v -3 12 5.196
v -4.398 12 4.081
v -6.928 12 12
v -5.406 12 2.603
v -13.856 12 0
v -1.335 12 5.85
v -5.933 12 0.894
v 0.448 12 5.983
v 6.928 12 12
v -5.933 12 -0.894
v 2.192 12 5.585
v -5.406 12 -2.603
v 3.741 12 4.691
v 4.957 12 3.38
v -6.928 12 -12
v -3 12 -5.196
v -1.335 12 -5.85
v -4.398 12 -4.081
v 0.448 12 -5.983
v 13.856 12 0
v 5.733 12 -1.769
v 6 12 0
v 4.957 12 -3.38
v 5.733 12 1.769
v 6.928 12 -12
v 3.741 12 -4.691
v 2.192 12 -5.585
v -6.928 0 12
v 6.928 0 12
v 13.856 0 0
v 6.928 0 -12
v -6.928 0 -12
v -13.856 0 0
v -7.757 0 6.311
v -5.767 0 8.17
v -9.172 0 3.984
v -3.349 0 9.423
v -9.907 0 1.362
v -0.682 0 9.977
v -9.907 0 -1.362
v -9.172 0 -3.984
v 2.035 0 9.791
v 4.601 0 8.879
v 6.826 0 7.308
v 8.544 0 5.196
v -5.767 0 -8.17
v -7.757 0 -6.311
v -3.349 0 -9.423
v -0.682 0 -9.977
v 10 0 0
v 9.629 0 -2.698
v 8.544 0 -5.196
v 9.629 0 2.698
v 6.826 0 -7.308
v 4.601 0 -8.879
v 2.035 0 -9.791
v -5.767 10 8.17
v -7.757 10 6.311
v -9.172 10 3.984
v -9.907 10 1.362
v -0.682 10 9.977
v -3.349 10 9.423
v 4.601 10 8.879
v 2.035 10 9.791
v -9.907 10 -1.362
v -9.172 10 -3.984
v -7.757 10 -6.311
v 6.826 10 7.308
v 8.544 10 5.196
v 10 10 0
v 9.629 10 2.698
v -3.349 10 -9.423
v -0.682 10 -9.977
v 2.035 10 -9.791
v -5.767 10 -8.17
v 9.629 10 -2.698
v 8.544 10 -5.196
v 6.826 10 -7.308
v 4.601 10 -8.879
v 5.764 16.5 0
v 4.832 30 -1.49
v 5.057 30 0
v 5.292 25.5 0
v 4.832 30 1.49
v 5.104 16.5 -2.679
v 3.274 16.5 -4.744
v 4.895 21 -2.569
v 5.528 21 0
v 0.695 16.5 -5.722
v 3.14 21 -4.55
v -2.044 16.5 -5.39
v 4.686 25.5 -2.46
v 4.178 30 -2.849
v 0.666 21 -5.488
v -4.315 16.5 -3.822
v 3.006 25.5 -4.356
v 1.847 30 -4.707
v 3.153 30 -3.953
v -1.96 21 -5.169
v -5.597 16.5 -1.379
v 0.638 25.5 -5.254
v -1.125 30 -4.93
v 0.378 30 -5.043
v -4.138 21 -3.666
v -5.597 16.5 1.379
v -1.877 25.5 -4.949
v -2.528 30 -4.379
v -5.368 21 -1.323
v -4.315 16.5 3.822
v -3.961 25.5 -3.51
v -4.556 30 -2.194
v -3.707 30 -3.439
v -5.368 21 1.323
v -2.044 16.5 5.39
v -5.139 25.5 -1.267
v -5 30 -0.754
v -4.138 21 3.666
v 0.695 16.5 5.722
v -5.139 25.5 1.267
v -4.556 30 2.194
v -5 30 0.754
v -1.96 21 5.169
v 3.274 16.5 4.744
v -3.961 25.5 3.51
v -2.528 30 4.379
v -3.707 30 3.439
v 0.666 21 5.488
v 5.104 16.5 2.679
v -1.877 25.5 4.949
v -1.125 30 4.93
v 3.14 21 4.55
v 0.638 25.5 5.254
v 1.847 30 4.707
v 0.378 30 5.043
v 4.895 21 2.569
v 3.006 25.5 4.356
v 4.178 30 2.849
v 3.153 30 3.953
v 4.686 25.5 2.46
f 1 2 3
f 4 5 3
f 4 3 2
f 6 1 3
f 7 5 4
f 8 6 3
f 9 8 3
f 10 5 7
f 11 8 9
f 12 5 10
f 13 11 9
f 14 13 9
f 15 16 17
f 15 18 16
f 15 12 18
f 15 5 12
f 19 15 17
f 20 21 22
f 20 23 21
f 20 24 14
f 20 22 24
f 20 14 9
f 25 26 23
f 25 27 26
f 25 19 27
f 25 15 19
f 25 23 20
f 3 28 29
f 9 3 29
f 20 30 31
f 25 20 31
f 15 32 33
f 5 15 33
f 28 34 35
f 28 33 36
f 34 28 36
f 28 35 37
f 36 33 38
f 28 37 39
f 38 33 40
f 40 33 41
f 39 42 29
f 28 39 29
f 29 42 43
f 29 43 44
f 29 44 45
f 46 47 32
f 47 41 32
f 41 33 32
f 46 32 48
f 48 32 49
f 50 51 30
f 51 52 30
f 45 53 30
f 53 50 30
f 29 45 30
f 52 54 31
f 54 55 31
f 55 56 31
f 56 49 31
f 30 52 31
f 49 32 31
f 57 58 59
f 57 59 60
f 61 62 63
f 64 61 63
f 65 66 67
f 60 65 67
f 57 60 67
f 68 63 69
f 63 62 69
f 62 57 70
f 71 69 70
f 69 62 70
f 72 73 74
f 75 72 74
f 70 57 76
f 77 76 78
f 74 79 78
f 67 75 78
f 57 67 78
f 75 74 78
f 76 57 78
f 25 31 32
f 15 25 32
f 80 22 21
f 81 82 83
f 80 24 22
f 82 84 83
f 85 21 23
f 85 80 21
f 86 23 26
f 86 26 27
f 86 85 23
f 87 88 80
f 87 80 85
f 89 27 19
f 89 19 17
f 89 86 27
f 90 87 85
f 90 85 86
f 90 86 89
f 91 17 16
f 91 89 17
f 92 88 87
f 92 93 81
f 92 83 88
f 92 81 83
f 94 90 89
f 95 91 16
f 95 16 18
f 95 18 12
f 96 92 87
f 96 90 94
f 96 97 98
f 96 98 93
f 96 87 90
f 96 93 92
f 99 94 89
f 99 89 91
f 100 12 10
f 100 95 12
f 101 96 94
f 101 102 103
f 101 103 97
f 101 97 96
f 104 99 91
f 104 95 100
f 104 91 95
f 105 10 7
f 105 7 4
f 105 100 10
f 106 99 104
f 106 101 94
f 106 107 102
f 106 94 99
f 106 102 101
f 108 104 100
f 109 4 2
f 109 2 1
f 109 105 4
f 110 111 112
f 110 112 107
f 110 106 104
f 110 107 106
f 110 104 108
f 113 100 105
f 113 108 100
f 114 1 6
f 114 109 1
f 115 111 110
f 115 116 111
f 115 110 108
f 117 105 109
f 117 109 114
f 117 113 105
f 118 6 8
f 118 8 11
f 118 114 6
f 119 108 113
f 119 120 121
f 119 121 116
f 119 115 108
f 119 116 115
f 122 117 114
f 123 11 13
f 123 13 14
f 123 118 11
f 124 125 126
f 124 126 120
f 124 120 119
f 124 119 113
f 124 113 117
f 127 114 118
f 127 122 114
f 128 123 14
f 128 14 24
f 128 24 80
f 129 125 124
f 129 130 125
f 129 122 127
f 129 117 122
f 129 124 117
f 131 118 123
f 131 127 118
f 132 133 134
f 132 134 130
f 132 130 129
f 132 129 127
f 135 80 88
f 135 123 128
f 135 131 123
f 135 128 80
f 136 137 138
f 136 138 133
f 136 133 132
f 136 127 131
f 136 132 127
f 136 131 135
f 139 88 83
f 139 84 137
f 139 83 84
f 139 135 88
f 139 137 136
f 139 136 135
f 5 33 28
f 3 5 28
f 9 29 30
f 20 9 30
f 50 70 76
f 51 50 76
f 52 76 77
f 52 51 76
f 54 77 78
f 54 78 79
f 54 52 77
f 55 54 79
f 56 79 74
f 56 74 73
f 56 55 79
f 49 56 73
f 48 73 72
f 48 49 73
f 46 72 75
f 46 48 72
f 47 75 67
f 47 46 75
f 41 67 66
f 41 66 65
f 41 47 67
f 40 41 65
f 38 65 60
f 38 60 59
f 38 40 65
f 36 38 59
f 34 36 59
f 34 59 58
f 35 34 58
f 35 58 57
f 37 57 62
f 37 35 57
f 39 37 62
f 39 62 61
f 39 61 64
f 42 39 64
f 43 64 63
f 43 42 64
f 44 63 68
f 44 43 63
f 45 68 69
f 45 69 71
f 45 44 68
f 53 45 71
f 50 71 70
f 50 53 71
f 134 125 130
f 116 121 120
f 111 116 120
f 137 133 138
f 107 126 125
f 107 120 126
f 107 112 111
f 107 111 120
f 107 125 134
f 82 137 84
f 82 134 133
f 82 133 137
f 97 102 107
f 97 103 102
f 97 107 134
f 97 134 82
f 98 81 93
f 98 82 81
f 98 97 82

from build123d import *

# Parameters (mm, degrees)
BOSS_EXTRUDE1_DEPTH = 12
BOSS_EXTRUDE2_START = 12
SKETCH2_R           = 6
BOSS_EXTRUDE2_DEPTH = 18
BOSS_EXTRUDE2_TAPER = 3
SKETCH3_R           = 10
CUT_EXTRUDE1_DEPTH  = 10


with BuildPart() as part:
    # Sketch1 → Boss-Extrude1 (new body)
    with BuildSketch(Plane(origin=(0, 0, 0), x_dir=(1, 0, 0), z_dir=(0, 1, 0))):
        Polygon((13.856406461, 0), (6.92820323, 12), (-6.92820323, 12), (-13.856406461, 0), (-6.92820323, -12), (6.92820323, -12), align=None)
    extrude(amount=BOSS_EXTRUDE1_DEPTH)

    # Sketch2 → Boss-Extrude2 (add)
    with BuildSketch(Plane(origin=(0, 0, 0), x_dir=(1, 0, 0), z_dir=(0, 1, 0)).offset(BOSS_EXTRUDE2_START)):
        Circle(SKETCH2_R)
    extrude(amount=BOSS_EXTRUDE2_DEPTH, taper=BOSS_EXTRUDE2_TAPER)

    # Sketch3 → Cut-Extrude1 (cut)
    with BuildSketch(Plane(origin=(0, 0, 0), x_dir=(1, 0, 0), z_dir=(0, 1, 0))):
        Circle(SKETCH3_R)
    extrude(amount=CUT_EXTRUDE1_DEPTH, mode=Mode.SUBTRACT)


solid = part.part
